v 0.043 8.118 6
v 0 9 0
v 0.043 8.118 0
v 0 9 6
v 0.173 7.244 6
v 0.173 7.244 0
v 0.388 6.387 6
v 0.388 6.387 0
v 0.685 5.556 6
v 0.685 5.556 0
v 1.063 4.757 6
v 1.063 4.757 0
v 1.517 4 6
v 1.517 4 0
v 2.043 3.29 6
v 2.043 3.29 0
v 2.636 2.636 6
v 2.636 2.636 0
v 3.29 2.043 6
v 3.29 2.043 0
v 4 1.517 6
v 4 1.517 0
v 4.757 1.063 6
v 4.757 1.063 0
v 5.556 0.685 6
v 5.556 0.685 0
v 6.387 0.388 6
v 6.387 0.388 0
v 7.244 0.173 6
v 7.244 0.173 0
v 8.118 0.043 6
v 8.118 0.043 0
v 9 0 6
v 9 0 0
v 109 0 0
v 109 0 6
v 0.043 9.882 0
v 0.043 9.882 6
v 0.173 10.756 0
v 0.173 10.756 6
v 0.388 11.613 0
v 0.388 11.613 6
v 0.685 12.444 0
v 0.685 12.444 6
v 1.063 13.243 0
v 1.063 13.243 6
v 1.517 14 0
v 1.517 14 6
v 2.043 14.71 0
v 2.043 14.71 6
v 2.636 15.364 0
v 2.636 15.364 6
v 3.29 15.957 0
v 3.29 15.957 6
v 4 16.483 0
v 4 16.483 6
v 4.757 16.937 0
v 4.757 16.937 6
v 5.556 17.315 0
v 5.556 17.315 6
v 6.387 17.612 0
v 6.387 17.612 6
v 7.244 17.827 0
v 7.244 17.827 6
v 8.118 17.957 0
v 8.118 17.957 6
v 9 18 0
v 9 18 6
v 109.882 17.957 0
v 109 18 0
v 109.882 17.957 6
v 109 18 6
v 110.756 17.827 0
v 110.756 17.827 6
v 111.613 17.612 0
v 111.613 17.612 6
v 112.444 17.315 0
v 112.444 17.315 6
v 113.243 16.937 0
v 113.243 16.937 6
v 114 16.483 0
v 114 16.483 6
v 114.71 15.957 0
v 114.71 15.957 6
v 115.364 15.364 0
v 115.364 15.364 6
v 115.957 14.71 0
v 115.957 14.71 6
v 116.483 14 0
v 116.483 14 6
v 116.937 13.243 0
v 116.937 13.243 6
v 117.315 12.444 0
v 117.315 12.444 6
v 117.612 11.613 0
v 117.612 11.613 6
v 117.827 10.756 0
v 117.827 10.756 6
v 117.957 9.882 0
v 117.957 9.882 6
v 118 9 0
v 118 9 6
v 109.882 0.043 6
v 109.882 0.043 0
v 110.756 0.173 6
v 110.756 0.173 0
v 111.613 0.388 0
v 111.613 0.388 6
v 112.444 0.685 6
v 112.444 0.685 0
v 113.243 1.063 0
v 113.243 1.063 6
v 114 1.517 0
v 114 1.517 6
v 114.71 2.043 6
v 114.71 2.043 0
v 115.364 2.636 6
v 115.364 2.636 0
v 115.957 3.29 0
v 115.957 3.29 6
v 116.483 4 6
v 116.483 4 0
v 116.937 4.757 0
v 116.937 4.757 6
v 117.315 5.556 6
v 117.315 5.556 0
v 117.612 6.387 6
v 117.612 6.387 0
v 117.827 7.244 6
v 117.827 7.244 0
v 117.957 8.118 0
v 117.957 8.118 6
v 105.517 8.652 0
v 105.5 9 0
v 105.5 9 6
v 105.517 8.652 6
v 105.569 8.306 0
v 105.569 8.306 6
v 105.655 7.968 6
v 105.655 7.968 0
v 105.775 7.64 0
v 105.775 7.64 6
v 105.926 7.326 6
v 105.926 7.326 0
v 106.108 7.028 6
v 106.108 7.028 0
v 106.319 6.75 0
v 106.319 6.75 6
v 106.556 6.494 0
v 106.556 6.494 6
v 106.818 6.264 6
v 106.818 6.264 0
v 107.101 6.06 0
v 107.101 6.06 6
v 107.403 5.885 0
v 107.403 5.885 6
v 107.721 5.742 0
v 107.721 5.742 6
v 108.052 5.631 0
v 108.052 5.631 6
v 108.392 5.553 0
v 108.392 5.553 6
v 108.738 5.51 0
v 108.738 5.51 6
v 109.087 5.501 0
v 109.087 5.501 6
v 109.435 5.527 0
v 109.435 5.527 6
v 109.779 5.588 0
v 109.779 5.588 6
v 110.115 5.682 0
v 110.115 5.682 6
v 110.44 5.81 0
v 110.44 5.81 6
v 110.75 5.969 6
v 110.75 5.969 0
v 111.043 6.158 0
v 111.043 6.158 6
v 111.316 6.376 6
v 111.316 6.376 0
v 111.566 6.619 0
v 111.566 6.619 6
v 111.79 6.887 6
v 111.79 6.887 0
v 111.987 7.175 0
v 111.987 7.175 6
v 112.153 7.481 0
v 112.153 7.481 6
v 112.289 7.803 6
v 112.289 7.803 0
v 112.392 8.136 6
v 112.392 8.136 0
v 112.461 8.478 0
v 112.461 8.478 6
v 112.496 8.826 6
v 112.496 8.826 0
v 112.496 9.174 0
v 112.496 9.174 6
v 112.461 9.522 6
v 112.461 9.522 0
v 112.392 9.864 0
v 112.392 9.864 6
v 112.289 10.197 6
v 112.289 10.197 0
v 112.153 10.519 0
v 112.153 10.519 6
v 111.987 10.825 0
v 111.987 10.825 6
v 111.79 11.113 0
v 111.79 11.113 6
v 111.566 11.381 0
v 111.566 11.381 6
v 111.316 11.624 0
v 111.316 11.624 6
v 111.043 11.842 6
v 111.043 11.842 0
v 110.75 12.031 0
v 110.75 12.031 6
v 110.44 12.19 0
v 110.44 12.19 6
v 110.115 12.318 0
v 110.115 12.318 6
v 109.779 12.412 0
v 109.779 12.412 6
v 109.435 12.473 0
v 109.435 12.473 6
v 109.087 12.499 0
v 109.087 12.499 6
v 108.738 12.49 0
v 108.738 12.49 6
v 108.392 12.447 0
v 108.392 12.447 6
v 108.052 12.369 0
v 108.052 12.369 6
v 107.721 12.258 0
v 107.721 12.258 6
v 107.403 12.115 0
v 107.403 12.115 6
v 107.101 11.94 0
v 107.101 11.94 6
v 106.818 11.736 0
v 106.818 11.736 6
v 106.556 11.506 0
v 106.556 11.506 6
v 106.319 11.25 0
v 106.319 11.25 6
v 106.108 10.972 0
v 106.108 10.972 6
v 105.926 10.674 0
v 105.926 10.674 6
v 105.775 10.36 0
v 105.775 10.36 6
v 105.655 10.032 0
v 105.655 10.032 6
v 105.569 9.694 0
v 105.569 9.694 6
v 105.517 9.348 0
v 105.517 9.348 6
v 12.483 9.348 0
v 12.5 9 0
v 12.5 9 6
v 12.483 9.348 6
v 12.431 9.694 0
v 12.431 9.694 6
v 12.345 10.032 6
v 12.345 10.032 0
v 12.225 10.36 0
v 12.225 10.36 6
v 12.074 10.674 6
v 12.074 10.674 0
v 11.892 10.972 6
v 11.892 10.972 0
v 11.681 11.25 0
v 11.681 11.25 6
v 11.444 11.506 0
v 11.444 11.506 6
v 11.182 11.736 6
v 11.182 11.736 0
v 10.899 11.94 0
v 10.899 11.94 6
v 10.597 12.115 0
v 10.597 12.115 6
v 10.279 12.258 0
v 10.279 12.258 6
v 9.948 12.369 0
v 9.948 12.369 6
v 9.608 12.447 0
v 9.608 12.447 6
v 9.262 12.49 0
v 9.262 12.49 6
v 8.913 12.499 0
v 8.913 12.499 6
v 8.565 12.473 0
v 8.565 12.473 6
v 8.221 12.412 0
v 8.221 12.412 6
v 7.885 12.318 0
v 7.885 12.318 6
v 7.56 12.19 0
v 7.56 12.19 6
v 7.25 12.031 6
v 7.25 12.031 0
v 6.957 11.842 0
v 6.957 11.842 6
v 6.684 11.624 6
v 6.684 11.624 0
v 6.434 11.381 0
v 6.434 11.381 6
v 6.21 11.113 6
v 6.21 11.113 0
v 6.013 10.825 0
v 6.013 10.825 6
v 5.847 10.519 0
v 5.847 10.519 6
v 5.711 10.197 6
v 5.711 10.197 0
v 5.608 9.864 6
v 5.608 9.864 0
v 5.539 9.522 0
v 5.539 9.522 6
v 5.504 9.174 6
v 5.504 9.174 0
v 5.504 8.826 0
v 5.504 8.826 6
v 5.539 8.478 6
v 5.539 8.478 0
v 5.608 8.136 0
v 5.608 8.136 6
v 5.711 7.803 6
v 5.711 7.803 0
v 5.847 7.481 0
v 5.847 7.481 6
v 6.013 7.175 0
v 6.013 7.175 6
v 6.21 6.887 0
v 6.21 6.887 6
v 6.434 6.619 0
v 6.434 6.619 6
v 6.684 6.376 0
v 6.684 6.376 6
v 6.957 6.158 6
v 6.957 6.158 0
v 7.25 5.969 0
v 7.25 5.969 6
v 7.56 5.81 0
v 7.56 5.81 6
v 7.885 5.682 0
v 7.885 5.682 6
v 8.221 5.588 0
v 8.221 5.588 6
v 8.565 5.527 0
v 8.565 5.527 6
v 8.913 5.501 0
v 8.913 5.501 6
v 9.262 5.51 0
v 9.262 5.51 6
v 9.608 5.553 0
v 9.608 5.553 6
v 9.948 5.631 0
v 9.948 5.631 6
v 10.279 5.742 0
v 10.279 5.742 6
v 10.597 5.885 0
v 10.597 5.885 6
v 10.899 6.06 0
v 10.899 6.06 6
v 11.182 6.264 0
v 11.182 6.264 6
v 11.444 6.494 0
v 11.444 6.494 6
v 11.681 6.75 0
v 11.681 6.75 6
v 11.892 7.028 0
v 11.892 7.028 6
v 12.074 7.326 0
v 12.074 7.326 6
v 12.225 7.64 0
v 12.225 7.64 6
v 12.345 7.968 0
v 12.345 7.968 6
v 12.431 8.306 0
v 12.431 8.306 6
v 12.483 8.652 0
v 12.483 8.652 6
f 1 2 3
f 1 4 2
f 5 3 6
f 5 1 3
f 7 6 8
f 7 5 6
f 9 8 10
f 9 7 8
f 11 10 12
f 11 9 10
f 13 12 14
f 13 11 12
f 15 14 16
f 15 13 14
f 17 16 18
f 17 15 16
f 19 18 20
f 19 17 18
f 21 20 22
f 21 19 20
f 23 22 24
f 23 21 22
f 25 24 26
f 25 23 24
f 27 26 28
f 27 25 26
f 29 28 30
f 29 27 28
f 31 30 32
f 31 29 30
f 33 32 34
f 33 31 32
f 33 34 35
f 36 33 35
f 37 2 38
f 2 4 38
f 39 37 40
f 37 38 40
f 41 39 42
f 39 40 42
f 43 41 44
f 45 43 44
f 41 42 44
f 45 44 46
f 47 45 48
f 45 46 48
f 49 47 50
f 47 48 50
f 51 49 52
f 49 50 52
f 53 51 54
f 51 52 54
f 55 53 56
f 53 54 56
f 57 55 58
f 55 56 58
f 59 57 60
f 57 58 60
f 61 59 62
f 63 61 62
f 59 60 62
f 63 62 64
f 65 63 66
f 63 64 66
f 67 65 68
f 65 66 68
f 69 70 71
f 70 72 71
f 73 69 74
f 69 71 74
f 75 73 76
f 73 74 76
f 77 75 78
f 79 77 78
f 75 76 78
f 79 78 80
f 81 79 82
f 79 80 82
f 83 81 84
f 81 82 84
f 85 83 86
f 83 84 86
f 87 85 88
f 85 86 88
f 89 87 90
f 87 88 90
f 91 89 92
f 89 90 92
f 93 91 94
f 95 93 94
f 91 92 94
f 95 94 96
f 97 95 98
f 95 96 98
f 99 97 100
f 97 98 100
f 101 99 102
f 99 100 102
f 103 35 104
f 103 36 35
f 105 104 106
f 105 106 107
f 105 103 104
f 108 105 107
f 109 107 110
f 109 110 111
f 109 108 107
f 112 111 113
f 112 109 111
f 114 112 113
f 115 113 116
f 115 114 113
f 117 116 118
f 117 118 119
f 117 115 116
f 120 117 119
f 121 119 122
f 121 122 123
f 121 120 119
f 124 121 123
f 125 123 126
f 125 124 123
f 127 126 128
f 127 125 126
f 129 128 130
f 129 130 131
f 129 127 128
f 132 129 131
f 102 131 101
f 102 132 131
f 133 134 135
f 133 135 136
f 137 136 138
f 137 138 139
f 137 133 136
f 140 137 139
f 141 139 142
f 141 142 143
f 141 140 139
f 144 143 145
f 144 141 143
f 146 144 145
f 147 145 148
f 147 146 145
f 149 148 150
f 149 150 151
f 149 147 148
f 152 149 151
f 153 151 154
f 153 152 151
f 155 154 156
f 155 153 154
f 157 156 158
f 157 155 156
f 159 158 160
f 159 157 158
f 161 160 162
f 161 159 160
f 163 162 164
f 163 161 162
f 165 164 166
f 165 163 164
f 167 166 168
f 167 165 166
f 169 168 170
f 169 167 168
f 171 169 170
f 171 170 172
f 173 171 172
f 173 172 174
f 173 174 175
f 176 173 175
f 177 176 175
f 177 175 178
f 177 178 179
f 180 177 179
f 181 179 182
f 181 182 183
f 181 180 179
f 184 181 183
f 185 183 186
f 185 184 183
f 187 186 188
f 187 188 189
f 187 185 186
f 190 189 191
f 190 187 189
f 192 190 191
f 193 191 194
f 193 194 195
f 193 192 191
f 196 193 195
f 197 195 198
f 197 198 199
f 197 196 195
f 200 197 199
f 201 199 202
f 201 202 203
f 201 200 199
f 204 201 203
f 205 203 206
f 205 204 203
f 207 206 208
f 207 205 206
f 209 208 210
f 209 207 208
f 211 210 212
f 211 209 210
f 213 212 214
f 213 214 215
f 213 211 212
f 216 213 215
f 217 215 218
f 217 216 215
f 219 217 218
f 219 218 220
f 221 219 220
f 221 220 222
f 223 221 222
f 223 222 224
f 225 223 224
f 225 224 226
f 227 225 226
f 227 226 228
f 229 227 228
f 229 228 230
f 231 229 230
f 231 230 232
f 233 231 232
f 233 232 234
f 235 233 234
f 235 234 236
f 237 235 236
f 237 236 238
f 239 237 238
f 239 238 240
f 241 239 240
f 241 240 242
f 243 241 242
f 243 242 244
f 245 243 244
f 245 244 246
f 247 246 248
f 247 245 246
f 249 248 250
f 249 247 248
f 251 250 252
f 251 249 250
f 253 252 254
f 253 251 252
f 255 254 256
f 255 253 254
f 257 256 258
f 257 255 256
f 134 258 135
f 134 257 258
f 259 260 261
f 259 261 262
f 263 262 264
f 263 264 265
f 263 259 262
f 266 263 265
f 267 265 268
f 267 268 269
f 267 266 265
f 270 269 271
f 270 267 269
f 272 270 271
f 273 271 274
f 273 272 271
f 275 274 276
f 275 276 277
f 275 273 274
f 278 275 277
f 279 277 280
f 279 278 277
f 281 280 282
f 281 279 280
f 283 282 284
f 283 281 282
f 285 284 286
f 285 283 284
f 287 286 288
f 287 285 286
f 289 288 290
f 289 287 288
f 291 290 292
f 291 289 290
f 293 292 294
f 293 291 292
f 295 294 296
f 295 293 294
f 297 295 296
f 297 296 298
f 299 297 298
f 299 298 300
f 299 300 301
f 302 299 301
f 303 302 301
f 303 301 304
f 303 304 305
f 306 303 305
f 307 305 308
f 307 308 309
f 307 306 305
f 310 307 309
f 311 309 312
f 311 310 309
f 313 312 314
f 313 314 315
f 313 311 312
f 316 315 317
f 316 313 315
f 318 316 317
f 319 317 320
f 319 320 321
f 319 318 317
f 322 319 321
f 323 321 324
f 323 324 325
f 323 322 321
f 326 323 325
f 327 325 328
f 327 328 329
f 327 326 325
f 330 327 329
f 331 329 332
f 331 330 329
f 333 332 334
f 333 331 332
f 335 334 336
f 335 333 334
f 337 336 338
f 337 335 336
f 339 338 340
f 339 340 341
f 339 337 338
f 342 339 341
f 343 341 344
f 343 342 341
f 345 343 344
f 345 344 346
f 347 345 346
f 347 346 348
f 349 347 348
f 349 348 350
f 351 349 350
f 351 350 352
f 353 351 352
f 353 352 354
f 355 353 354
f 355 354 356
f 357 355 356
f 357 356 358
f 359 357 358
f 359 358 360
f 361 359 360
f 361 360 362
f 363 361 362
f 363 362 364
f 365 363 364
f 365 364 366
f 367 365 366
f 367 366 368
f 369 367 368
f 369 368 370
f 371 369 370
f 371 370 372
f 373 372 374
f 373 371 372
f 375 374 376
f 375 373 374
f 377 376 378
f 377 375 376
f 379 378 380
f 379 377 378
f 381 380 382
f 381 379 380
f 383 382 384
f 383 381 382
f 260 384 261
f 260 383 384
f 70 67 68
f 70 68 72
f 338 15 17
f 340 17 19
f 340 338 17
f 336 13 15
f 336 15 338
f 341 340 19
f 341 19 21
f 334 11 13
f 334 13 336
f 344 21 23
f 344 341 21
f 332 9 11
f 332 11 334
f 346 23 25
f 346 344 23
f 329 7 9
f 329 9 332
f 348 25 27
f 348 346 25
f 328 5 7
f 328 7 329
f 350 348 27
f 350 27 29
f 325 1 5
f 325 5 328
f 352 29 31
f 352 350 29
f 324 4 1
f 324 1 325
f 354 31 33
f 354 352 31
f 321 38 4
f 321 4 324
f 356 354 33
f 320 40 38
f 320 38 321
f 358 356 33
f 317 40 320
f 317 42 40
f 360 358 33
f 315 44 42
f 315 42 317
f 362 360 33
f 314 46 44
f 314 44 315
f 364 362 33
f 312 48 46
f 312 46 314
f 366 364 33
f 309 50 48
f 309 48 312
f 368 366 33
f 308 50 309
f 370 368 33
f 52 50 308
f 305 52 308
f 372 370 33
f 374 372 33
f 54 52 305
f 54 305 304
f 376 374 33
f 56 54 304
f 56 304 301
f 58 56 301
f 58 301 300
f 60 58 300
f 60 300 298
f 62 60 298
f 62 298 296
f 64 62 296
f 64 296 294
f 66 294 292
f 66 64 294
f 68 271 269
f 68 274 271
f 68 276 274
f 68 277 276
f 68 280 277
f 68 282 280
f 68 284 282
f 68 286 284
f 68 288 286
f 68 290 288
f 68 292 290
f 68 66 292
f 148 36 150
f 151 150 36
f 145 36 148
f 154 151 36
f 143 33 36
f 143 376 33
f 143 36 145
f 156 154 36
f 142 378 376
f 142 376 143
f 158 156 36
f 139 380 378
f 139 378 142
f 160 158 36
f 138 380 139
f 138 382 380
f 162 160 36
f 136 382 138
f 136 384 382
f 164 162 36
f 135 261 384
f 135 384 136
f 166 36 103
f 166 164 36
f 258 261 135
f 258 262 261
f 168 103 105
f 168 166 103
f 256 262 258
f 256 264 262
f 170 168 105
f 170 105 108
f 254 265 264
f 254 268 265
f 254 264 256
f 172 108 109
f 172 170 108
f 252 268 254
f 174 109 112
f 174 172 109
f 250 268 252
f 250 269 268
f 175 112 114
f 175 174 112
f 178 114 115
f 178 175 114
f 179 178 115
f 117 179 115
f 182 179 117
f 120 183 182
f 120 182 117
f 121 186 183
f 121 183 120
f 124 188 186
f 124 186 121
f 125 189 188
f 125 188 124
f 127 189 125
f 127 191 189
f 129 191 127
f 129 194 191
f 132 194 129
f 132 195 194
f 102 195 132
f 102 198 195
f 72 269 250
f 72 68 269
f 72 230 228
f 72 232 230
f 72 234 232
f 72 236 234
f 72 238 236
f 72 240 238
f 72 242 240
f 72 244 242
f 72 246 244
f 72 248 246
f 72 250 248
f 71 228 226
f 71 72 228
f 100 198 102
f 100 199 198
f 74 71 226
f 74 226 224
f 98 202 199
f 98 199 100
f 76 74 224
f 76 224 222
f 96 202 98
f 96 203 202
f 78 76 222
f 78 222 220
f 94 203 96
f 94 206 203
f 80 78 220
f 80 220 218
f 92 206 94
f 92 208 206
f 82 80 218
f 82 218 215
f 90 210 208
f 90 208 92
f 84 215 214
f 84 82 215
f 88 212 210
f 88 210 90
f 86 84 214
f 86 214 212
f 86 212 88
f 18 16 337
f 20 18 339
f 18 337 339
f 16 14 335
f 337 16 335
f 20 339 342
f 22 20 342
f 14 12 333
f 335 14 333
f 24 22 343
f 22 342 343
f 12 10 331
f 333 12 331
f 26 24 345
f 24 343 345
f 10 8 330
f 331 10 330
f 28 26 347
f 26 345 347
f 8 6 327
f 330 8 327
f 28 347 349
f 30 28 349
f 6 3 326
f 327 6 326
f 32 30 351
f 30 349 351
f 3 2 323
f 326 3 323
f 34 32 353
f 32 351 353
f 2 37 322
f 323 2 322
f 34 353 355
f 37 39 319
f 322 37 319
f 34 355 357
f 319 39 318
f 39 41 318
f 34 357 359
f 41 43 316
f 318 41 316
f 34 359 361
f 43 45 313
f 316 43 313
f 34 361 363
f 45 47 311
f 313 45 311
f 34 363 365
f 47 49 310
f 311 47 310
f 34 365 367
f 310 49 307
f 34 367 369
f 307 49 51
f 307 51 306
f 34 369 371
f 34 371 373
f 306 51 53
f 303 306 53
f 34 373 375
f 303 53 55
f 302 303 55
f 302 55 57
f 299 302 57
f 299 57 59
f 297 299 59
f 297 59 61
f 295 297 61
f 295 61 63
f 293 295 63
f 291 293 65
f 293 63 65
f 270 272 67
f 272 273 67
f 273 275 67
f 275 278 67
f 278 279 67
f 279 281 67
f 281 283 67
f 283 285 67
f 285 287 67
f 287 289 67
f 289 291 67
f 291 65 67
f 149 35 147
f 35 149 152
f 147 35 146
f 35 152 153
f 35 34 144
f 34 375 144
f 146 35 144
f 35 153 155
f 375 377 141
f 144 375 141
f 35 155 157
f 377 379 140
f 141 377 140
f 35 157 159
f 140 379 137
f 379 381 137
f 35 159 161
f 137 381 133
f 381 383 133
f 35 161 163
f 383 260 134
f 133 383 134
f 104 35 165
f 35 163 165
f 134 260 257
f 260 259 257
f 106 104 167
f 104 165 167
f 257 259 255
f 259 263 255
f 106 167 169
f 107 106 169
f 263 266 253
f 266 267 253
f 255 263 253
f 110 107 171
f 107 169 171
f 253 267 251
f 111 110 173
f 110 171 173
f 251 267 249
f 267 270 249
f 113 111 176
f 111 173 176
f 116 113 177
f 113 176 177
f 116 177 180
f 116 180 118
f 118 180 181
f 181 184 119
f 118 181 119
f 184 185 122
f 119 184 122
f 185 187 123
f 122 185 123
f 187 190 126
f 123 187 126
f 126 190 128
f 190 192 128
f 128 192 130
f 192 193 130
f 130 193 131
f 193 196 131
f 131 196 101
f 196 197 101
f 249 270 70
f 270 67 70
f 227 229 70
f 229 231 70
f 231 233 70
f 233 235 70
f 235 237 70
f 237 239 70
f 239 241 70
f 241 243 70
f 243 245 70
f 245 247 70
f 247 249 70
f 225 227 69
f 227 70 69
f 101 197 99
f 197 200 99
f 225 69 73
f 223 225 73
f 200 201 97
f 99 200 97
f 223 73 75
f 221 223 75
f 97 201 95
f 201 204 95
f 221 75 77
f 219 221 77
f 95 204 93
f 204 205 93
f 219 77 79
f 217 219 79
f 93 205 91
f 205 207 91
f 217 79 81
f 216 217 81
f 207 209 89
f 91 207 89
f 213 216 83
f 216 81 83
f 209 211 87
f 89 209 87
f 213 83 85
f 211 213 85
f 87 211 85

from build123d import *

# Parameters (mm, degrees)
ESQUISSE1_W        = 118
ESQUISSE1_H        = 18
ESQUISSE1_R        = 3.5
BOSS_EXTRU_1_DEPTH = 6
CONG_1_R           = 9


with BuildPart() as part:
    # Esquisse1 → Boss.-Extru.1 (new body)
    with BuildSketch(Plane.XY):
        with Locations((59, 9)):
            Rectangle(ESQUISSE1_W, ESQUISSE1_H)
        with Locations((9, 9)):
            Circle(ESQUISSE1_R, mode=Mode.SUBTRACT)
        with Locations(Location((109, 9, 0), (0, 0, 180))):
            Circle(ESQUISSE1_R, mode=Mode.SUBTRACT)
    extrude(amount=BOSS_EXTRU_1_DEPTH)

    # Congé1
    cong_1_edges = [part.edges().sort_by_distance(p)[0] for p in [
        (118, 18, 3),
        (118, 0, 3),
        (0, 0, 3),
        (0, 18, 3),
    ]]
    fillet(cong_1_edges, radius=CONG_1_R - 0.0001)  # a hair under: the kernel refuses the full size


solid = part.part
